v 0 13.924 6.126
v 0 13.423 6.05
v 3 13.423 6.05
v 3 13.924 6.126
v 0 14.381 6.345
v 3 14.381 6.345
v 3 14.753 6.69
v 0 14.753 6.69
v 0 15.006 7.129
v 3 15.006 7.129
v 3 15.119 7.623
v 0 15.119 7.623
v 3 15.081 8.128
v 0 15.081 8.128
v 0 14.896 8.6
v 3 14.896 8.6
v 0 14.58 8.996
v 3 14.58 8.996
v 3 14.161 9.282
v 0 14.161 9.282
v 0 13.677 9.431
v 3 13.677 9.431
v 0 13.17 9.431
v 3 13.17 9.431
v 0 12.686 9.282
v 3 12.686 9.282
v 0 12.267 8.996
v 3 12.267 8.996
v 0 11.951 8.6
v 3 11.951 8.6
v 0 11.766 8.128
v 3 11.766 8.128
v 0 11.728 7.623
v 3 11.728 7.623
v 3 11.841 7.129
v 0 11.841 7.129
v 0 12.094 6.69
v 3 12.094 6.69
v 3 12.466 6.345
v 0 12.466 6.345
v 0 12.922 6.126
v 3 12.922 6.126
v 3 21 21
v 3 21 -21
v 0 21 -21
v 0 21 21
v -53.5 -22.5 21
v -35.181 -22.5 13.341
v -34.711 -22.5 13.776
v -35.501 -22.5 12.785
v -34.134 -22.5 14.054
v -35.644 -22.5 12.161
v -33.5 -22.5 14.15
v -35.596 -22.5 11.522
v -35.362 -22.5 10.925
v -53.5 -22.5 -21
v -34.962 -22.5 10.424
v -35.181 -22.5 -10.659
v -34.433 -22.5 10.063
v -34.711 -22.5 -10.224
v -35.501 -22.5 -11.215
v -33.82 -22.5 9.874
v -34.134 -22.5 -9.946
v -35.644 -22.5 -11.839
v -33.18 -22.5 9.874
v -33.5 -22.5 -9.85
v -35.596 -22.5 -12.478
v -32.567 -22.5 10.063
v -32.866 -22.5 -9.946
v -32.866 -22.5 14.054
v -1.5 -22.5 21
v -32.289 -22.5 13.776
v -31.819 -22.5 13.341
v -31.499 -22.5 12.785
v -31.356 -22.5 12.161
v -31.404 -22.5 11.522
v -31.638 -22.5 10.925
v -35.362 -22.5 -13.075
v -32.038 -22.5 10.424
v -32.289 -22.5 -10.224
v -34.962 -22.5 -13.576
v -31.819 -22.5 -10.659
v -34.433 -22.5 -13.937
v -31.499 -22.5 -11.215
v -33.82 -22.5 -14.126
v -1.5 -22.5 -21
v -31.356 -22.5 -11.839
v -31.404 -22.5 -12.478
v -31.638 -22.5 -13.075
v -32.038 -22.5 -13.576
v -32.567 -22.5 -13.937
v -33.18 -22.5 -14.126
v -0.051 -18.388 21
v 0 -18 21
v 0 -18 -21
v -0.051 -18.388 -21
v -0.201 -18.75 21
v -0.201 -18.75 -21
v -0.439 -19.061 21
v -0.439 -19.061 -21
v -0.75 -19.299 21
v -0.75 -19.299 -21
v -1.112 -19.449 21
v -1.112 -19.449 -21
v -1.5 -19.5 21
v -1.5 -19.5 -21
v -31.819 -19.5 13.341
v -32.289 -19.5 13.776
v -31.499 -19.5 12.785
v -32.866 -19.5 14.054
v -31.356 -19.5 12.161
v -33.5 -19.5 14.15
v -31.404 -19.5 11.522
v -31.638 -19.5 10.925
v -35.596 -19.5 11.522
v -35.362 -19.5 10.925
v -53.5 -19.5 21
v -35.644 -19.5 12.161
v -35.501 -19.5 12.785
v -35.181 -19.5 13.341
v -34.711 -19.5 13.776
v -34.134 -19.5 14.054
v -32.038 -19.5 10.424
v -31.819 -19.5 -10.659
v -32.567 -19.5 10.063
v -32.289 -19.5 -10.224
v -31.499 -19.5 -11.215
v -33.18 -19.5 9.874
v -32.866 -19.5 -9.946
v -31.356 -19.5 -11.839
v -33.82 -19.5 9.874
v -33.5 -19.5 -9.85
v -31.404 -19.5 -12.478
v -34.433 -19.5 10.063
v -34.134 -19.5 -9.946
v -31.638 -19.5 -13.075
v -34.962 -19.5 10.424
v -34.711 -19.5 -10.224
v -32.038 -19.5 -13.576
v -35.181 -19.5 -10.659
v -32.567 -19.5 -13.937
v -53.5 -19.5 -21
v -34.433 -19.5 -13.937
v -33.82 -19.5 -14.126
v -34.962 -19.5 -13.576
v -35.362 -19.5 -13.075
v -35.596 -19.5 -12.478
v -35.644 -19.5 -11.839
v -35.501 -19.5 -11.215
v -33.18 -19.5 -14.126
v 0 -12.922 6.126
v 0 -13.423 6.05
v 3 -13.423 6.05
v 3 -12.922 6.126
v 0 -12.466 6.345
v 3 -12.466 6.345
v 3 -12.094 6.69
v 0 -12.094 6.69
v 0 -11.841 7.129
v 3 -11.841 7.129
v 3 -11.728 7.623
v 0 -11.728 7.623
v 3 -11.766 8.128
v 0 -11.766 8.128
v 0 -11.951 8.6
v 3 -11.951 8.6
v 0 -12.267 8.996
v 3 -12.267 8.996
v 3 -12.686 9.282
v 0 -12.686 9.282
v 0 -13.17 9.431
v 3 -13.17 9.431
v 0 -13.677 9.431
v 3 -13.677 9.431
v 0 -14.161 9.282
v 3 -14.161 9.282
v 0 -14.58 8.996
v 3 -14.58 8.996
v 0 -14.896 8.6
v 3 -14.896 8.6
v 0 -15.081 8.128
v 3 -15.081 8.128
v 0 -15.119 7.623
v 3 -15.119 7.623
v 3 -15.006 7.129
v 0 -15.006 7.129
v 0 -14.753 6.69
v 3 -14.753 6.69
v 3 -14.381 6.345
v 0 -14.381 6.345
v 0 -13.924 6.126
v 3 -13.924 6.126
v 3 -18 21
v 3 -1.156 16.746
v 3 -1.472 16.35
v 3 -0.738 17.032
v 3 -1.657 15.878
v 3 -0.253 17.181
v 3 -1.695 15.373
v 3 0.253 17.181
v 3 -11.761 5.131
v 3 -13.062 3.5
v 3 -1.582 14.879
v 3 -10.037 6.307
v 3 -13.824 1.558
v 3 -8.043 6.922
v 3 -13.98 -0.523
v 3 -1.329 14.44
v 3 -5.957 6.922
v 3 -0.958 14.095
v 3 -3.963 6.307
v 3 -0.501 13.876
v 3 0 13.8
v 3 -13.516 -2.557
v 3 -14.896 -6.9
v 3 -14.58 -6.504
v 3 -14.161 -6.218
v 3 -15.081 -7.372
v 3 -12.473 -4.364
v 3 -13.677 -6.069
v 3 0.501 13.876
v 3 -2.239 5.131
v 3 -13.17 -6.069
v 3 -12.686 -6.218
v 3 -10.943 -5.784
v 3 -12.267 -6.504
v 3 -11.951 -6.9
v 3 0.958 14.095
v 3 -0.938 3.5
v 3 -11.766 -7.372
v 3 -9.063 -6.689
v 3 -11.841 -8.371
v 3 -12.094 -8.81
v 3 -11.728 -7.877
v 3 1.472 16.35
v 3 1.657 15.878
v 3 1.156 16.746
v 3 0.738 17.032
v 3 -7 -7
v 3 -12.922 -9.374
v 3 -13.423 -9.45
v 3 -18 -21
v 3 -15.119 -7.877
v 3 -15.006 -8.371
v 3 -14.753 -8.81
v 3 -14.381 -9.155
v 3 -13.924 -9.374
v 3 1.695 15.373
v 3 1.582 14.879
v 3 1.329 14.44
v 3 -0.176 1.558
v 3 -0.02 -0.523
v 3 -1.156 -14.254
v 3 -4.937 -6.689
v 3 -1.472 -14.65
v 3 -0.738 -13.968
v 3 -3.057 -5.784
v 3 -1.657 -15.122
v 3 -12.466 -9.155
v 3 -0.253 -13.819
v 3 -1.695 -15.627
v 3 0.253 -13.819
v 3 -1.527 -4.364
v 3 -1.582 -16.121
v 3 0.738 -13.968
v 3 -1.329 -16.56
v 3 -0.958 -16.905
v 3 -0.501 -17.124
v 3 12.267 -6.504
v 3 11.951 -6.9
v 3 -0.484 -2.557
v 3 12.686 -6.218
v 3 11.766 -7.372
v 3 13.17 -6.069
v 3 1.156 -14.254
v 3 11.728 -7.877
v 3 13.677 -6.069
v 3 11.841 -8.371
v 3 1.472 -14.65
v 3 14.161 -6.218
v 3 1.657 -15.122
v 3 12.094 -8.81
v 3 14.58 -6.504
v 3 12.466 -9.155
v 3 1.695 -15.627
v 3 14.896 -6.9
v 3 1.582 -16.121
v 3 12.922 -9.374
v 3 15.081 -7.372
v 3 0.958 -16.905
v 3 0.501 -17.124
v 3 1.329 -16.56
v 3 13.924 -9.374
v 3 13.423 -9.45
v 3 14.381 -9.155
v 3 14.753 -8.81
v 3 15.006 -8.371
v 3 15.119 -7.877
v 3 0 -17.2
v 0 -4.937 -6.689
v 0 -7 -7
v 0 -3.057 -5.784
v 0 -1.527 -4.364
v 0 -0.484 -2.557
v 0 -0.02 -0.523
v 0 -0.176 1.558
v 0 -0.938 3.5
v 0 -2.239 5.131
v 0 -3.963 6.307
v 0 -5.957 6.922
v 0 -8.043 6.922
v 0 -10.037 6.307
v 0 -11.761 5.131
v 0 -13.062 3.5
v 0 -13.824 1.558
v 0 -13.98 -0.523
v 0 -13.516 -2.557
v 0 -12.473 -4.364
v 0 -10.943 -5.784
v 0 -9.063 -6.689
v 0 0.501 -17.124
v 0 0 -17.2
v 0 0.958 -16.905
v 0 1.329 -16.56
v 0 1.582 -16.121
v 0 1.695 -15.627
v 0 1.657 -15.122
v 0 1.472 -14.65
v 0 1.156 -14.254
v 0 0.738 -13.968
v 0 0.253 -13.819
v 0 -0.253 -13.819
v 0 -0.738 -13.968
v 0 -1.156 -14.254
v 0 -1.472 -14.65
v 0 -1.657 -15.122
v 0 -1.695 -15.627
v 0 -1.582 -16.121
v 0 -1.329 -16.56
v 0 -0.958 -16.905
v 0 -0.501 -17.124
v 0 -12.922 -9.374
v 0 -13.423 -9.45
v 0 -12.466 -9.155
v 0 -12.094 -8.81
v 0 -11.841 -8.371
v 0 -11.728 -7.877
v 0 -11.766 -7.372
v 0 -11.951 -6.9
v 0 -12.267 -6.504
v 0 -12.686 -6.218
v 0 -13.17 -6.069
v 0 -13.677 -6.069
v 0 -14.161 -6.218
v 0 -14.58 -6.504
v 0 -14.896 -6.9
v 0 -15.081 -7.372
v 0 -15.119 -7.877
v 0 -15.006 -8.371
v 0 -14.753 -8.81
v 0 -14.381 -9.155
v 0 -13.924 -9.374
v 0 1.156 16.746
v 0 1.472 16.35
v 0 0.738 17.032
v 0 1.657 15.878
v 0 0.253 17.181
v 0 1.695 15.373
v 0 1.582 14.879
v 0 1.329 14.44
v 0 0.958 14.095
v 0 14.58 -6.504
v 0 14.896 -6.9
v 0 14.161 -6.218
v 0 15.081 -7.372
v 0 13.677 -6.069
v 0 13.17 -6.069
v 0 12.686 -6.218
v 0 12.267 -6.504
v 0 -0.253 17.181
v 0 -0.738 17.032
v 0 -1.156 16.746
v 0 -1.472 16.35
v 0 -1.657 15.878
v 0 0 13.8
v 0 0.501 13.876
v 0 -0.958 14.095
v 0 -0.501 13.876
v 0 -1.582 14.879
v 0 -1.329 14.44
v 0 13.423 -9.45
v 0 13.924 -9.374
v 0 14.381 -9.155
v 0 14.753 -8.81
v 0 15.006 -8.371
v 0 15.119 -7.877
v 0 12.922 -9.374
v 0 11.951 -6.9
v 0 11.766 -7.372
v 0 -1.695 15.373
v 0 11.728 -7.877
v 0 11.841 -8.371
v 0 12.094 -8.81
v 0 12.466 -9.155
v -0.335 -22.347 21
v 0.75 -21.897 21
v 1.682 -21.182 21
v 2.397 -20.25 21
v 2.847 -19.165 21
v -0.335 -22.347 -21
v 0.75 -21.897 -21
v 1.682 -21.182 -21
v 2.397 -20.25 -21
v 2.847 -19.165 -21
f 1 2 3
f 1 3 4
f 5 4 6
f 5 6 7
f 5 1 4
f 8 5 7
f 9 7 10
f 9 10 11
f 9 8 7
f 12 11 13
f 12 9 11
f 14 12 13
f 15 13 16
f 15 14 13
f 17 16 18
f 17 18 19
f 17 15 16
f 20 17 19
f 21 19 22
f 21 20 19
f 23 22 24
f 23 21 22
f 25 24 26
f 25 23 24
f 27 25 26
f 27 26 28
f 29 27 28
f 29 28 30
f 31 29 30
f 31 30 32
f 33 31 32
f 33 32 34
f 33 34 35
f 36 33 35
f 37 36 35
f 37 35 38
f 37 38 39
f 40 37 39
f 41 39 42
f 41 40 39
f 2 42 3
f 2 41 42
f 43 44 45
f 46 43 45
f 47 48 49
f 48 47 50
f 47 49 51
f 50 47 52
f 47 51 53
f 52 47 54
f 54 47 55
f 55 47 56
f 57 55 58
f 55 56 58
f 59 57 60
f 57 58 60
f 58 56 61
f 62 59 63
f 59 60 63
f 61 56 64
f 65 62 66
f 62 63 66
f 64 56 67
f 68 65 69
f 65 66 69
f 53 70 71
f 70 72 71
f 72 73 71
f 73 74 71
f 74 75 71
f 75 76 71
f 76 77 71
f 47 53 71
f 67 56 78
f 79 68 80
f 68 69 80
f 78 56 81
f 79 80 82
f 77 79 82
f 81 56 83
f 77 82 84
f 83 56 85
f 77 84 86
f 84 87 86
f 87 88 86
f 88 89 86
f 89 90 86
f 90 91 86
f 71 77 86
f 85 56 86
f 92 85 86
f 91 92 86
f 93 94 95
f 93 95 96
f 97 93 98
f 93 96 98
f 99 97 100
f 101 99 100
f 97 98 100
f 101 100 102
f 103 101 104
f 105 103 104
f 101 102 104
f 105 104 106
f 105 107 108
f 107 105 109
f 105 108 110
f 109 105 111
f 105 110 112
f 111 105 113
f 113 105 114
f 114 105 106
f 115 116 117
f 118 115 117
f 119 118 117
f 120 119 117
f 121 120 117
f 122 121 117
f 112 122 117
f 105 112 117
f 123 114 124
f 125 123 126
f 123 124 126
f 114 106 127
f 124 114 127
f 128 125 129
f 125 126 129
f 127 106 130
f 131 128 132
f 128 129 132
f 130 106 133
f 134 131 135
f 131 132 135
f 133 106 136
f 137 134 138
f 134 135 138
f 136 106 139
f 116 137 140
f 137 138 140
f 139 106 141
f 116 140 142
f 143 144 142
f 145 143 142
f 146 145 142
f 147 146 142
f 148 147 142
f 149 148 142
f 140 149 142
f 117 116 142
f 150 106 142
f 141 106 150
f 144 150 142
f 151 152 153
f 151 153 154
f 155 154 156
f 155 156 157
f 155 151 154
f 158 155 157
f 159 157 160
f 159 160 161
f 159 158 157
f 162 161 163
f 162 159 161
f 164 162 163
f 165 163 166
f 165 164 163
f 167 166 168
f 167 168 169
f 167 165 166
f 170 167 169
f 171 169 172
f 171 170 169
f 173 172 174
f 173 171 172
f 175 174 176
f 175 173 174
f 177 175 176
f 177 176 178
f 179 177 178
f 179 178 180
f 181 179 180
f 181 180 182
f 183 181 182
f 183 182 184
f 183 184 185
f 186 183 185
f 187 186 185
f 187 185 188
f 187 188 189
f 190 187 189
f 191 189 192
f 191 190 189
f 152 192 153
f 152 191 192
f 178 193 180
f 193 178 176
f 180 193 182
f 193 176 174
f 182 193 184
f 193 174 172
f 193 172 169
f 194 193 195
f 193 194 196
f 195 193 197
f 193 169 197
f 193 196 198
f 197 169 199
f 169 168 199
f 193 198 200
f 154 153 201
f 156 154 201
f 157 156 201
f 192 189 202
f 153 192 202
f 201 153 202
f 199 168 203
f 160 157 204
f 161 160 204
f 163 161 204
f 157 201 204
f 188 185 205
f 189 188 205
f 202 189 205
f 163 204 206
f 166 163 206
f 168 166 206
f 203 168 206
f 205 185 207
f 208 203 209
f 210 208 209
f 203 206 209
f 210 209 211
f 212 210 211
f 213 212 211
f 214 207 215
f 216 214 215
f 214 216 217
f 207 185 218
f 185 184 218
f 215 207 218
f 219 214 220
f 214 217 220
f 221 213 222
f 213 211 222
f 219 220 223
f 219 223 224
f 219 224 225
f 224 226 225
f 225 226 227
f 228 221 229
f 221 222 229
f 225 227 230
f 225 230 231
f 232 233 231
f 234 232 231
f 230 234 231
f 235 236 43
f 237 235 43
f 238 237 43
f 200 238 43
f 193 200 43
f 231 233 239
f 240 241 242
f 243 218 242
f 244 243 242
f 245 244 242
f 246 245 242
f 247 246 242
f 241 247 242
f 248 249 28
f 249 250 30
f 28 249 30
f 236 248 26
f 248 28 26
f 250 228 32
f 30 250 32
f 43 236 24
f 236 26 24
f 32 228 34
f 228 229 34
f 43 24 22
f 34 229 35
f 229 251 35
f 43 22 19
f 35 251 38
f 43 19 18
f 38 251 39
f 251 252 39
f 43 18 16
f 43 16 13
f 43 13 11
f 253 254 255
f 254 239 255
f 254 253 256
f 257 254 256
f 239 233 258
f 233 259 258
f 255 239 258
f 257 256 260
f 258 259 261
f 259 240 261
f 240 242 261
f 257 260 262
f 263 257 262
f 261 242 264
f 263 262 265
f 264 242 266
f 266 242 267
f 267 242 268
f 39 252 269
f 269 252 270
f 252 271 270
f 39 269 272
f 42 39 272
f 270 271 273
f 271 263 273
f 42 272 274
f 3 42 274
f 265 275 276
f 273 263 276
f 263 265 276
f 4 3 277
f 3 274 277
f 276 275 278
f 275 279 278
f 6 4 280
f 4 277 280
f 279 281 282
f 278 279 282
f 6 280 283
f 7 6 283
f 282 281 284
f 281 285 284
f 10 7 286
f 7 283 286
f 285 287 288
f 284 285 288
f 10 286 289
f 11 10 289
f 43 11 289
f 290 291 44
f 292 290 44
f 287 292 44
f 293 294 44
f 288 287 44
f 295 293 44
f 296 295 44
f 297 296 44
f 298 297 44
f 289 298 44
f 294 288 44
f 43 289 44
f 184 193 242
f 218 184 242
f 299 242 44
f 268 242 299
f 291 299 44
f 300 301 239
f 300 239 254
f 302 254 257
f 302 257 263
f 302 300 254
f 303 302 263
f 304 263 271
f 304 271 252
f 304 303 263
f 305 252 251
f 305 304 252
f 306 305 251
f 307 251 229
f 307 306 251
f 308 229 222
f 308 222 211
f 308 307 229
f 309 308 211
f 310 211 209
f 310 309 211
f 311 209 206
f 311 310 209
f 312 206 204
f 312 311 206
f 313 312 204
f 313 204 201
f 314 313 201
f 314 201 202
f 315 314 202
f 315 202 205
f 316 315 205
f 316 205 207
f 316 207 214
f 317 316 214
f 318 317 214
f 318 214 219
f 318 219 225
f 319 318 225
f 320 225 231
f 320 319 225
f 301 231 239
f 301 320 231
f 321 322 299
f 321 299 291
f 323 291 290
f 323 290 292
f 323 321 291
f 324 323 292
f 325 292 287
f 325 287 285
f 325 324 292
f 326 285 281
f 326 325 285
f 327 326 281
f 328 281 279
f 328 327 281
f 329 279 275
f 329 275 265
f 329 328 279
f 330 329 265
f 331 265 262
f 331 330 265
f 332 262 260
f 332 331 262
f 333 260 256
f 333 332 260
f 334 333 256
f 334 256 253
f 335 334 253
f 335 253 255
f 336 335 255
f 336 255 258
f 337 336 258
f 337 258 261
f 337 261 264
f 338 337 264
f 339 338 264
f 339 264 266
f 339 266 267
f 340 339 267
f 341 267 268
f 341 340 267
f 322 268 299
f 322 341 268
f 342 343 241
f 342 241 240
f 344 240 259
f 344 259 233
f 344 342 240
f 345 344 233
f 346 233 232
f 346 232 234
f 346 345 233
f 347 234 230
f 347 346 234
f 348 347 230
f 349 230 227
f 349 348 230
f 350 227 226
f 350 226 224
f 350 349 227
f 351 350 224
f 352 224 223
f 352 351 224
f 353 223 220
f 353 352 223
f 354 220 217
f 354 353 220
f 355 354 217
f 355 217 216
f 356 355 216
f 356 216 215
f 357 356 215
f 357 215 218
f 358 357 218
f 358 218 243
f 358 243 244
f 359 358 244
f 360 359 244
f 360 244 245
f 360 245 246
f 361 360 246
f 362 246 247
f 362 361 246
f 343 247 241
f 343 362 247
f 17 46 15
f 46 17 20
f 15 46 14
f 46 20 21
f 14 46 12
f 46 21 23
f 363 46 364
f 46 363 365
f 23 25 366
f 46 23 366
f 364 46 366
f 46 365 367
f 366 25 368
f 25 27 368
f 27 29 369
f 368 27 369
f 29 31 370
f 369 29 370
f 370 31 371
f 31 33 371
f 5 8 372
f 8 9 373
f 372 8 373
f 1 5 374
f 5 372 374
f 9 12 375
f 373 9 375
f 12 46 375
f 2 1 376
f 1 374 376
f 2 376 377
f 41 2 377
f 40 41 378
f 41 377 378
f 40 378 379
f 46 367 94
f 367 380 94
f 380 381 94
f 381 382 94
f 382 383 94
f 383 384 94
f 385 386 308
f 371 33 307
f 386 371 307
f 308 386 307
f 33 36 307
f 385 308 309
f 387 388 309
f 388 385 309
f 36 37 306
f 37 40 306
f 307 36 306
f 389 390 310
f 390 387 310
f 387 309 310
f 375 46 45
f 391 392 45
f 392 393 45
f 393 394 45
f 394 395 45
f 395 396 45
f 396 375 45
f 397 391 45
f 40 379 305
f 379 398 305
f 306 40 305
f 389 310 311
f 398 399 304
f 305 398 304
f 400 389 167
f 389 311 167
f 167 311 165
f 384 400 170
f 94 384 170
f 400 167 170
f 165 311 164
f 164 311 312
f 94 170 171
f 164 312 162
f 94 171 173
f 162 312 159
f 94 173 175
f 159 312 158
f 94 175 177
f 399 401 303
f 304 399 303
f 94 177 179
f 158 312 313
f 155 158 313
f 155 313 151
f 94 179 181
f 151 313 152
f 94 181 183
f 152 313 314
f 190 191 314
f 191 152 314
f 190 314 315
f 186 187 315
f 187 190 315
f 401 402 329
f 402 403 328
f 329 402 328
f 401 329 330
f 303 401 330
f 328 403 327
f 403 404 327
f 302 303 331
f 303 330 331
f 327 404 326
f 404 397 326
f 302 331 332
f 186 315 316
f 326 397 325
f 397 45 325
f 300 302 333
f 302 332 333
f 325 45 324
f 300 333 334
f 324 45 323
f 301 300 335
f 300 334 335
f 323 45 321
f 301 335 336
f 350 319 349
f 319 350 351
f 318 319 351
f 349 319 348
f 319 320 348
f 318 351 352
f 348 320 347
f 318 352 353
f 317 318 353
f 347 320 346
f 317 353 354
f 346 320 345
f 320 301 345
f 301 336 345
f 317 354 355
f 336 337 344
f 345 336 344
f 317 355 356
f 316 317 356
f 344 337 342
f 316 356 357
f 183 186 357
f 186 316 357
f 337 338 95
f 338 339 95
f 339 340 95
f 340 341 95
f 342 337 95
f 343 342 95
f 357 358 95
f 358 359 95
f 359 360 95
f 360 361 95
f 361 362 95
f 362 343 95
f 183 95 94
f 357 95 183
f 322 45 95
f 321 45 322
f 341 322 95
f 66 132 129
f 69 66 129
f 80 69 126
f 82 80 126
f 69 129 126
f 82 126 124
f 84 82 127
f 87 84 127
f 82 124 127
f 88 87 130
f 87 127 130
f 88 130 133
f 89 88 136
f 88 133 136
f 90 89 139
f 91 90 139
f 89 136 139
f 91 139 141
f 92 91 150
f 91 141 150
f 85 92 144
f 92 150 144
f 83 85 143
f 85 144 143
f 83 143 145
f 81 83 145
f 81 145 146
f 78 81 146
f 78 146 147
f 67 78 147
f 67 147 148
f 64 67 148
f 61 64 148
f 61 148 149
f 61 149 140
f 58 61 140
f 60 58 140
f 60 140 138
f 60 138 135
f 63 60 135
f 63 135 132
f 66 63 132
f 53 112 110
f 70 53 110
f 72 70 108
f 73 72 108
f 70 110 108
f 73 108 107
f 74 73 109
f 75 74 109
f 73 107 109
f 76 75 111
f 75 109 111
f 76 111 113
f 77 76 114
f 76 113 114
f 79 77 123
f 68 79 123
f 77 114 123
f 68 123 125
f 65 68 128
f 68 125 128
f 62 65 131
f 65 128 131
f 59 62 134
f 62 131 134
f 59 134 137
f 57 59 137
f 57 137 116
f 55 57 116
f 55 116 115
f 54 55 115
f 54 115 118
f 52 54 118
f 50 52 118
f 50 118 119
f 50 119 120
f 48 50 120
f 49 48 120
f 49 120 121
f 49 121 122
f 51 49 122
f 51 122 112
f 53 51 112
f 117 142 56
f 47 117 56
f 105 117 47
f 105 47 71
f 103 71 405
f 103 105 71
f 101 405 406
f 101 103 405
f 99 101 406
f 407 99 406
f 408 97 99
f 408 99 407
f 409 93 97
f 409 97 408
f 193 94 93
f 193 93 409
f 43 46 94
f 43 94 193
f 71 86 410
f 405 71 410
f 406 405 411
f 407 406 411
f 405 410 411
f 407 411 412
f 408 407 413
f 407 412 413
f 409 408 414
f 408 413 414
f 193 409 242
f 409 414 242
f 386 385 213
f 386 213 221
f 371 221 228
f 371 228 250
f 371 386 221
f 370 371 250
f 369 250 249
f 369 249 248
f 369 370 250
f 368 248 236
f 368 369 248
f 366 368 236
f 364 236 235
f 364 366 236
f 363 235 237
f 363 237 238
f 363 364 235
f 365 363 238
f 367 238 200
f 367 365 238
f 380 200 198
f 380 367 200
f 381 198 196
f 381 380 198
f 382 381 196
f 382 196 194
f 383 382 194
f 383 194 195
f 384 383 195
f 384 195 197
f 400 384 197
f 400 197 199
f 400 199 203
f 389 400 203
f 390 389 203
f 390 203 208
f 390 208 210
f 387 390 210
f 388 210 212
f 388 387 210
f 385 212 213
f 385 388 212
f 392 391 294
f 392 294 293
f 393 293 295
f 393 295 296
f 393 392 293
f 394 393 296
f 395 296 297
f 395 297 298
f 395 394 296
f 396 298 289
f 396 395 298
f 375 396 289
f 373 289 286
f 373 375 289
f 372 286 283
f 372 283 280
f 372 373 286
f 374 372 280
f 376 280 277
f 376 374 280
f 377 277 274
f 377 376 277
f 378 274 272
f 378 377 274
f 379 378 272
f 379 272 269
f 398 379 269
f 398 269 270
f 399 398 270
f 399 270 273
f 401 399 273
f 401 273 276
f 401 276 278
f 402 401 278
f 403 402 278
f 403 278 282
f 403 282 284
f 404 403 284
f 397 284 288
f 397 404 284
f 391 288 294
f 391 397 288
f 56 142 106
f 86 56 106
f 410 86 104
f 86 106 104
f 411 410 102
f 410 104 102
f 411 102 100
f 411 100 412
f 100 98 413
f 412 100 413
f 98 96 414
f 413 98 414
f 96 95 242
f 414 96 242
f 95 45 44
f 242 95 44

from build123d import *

# Parameters (mm, degrees)
SM_BRACKET_DEPTH     = 42
SK_MOTORHOLES_R      = 1.7
SK_MOTORHOLES_R_2    = 7
CUT_MOTORHOLES_DEPTH = 3
SK_RAILHOLES_R       = 2.15
CUT_RAILHOLES_DEPTH  = 30


# Sheet-metal steps are written as plain solids
with BuildPart() as part:
    # SK_Bracket → SM_Bracket (new body)
    with BuildSketch(Plane.XY.offset(-21)):
        with BuildLine():
            Line((0, 21), (0, -18))
            ThreePointArc((0, -18), (-0.439339828, -19.060660172), (-1.5, -19.5))
            Line((-1.5, -19.5), (-53.5, -19.5))
            Line((-53.5, -19.5), (-53.5, -22.5))
            Line((-53.5, -22.5), (-1.5, -22.5))
            ThreePointArc((-1.5, -22.5), (1.681980515, -21.181980515), (3, -18))
            Line((3, -18), (3, 21))
            Line((3, 21), (0, 21))
        make_face()
    extrude(amount=SM_BRACKET_DEPTH)

    # SK_MotorHoles → CUT_MotorHoles (cut)
    with BuildSketch(Plane(origin=(0, 0, 0), x_dir=(0, 0, -1), z_dir=(1, 0, 0))):
        with Locations((-15.5, 0)):
            Circle(SK_MOTORHOLES_R)
        with Locations((-7.75, 13.423393759)):
            Circle(SK_MOTORHOLES_R)
        with Locations((7.75, 13.423393759)):
            Circle(SK_MOTORHOLES_R)
        with Locations((15.5, 0)):
            Circle(SK_MOTORHOLES_R)
        with Locations((7.75, -13.423393759)):
            Circle(SK_MOTORHOLES_R)
        with Locations((-7.75, -13.423393759)):
            Circle(SK_MOTORHOLES_R)
        with Locations((0, -7)):
            Circle(SK_MOTORHOLES_R_2)
    extrude(amount=CUT_MOTORHOLES_DEPTH, mode=Mode.SUBTRACT)

    # SK_RailHoles → CUT_RailHoles (cut)
    with BuildSketch(Plane(origin=(0, 0, 0), x_dir=(1, 0, 0), z_dir=(0, 1, 0))):
        with Locations(Location((-33.5, -12, 0), (0, 0, 270))):
            Circle(SK_RAILHOLES_R)
        with Locations(Location((-33.5, 12, 0), (0, 0, 270))):
            Circle(SK_RAILHOLES_R)
    extrude(amount=-CUT_RAILHOLES_DEPTH, mode=Mode.SUBTRACT)


solid = part.part
